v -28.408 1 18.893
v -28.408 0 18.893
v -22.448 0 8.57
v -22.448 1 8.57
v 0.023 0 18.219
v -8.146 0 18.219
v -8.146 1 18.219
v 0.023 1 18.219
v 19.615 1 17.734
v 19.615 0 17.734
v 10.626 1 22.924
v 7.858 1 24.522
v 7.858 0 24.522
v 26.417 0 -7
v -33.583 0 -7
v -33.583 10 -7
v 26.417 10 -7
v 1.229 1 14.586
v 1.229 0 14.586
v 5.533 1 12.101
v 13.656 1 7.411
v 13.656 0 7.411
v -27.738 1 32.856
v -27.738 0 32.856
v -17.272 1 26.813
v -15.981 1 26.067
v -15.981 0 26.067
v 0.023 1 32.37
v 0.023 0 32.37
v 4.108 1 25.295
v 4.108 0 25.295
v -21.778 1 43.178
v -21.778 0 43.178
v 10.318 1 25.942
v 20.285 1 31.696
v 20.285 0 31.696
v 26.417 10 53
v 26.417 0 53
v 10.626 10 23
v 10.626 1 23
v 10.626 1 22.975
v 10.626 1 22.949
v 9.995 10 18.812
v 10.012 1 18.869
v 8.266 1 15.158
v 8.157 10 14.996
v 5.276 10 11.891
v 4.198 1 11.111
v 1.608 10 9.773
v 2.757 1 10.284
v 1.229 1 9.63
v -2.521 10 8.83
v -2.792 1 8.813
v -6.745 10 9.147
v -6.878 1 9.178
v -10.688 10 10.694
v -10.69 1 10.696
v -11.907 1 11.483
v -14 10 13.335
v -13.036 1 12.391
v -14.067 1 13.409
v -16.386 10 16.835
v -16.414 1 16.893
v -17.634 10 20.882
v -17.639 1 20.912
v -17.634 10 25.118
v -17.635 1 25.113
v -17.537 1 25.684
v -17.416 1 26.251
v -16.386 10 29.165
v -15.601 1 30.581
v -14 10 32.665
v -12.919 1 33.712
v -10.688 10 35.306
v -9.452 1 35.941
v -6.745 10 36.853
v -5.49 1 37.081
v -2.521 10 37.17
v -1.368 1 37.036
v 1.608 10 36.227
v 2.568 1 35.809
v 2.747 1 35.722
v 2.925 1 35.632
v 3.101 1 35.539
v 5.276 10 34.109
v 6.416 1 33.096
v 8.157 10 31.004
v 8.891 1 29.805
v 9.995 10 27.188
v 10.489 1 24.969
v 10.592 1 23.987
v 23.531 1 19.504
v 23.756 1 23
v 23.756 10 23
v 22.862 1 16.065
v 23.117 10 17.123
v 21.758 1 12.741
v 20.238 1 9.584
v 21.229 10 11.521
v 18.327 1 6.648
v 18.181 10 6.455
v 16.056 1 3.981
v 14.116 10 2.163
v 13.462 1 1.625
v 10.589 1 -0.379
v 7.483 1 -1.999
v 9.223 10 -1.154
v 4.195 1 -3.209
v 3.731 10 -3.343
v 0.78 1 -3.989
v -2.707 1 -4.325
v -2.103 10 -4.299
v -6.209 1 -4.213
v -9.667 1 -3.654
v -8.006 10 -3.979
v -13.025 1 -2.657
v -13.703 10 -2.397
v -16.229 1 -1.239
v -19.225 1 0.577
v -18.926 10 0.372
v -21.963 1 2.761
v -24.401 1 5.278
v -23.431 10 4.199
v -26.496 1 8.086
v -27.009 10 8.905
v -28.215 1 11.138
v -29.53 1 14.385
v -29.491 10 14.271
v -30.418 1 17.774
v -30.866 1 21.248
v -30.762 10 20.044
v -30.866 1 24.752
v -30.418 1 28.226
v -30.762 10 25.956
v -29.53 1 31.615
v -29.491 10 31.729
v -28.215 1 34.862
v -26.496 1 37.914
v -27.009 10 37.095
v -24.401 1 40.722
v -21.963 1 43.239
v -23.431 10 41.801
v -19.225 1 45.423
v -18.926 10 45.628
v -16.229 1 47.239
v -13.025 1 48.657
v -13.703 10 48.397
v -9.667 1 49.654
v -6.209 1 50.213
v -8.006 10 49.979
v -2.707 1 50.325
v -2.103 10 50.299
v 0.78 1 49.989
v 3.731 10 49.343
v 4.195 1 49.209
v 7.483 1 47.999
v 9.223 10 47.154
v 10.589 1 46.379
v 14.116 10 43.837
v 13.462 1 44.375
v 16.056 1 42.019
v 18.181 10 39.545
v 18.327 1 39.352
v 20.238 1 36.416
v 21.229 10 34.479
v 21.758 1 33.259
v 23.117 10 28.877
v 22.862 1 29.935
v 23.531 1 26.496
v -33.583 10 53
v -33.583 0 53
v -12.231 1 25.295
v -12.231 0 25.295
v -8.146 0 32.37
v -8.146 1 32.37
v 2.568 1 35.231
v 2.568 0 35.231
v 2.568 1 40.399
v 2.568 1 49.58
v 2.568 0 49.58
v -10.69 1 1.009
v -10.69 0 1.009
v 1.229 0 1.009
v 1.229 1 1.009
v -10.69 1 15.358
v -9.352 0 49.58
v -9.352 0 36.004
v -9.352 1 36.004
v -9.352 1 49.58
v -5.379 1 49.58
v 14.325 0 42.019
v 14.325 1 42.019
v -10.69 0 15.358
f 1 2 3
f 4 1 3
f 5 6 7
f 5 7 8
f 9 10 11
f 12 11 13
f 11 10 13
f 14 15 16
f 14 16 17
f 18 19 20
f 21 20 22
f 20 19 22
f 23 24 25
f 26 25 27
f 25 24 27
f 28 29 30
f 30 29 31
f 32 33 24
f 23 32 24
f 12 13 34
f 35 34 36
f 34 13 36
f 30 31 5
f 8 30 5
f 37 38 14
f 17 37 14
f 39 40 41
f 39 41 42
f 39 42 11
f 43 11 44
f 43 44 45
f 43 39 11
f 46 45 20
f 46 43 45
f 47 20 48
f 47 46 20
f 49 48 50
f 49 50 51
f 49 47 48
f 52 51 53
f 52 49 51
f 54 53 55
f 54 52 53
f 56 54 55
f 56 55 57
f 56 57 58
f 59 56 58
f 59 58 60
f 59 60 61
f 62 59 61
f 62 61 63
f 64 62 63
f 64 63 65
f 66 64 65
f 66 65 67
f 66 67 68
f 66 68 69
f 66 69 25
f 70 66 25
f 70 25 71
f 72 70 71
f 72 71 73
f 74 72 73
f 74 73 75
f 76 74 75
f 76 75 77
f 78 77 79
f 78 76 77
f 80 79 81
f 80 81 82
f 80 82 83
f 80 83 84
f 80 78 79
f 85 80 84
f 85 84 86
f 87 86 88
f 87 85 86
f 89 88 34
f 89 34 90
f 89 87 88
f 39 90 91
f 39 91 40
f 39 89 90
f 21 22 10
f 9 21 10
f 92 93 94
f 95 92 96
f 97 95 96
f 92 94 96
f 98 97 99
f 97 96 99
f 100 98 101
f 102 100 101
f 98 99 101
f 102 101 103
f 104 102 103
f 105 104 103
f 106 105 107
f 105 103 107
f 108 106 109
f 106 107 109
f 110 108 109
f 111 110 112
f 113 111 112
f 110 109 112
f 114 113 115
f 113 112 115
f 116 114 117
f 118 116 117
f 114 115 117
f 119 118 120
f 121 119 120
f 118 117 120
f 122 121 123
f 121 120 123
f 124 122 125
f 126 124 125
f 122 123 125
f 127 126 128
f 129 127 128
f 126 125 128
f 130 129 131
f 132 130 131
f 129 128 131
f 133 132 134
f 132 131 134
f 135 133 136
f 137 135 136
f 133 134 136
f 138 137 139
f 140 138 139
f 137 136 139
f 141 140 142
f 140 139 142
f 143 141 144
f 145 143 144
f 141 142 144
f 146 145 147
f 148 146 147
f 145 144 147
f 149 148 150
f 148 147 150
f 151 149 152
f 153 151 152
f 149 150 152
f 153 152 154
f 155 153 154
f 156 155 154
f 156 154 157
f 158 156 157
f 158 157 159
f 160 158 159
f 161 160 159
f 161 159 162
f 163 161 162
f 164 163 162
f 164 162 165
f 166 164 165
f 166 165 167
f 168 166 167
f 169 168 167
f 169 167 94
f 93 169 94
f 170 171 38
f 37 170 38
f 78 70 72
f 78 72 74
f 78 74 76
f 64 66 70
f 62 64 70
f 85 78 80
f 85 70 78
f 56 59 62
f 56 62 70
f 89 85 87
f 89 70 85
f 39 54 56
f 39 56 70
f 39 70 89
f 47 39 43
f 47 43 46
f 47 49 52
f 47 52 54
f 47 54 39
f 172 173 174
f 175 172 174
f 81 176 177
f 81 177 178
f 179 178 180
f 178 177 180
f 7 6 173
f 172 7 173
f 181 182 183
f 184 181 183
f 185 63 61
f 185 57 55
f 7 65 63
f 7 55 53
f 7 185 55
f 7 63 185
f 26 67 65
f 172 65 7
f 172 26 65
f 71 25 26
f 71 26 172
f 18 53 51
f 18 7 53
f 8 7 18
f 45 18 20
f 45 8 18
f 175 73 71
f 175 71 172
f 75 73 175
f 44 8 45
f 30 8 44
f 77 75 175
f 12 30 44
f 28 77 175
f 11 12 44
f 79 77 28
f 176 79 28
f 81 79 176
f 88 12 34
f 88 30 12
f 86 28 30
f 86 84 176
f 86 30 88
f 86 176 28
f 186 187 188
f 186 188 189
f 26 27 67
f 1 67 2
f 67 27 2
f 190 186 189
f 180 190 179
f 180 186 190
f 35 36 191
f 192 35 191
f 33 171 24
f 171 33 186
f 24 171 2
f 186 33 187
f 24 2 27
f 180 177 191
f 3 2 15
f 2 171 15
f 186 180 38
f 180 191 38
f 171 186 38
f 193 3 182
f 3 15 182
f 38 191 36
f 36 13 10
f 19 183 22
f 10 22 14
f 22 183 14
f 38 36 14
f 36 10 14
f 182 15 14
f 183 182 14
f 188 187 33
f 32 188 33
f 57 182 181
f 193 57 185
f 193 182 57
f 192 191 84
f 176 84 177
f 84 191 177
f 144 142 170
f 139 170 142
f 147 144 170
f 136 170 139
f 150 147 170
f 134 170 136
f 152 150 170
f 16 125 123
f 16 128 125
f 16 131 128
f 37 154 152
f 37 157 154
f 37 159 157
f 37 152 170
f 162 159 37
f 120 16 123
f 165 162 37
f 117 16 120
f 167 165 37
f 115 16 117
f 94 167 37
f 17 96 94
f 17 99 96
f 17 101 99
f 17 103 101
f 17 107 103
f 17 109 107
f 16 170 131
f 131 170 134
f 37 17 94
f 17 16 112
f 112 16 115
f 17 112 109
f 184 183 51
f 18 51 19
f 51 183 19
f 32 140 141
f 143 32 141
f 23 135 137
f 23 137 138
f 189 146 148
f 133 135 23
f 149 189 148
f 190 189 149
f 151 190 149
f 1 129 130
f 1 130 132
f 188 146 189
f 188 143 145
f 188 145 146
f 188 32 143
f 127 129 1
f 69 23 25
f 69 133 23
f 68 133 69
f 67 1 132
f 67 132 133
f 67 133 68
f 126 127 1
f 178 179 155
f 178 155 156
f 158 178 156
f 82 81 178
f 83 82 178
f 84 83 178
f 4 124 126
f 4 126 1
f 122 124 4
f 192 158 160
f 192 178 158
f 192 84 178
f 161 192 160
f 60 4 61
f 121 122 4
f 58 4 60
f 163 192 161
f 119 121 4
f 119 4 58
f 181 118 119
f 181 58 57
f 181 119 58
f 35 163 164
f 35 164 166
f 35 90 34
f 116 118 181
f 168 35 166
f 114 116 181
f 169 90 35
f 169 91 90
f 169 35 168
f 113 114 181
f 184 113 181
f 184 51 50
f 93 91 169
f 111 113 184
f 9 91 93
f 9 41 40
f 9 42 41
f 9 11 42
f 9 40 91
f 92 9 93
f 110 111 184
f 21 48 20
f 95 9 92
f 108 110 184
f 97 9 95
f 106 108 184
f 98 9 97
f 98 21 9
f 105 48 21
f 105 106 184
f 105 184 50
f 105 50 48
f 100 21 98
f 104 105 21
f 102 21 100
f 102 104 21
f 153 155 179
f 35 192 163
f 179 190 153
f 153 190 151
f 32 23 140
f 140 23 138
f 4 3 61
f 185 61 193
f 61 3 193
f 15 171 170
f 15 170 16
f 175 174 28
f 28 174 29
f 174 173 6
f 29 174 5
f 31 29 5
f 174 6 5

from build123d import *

# Parameters (mm, degrees)
SKETCH1_W           = 60
SKETCH1_H           = 60
BOSS_EXTRUDE1_DEPTH = 10
SKETCH2_R           = 27.339129043
SKETCH2_R_2         = 14.209467058
CUT_EXTRUDE1_DEPTH  = 9
SKETCH3_W           = 11.919517594
SKETCH3_H           = 17.209998666
SKETCH3_W_2         = 11.919517595
CUT_EXTRUDE3_DEPTH  = 1


with BuildPart() as part:
    # Sketch1 → Boss-Extrude1 (new body)
    with BuildSketch(Plane(origin=(0, 0, 0), x_dir=(1, 0, 0), z_dir=(0, 1, 0))):
        with Locations((-3.583333333, -23)):
            Rectangle(SKETCH1_W, SKETCH1_H)
    extrude(amount=BOSS_EXTRUDE1_DEPTH)

    # Sketch2 → Cut-Extrude1 (cut)
    with BuildSketch(Plane(origin=(0, 10, 0), x_dir=(1, 0, 0), z_dir=(0, 1, 0))):
        with Locations((-3.583333333, -23)):
            Circle(SKETCH2_R)
        with Locations((-3.583333333, -23)):
            Circle(SKETCH2_R_2, mode=Mode.SUBTRACT)
    extrude(amount=-CUT_EXTRUDE1_DEPTH, mode=Mode.SUBTRACT)

    # Sketch3 → Cut-Extrude3 (cut)
    with BuildSketch(Plane.XZ):
        Polygon((14.324988363, 42.018967665), (-0.579307681, 33.413968332), (5.380451117, 23.091363294), (20.284747161, 31.696362627), align=None)
        with Locations((-3.392111126, 40.974887496)):
            Rectangle(SKETCH3_W, SKETCH3_H)
        Polygon((19.615469435, 17.733747325), (4.711173391, 26.338746658), (-1.248585407, 16.01614162), (13.655710637, 7.411142287), align=None)
        with Locations((-4.730666578, 9.614445482)):
            Rectangle(SKETCH3_W_2, SKETCH3_H)
        Polygon((-22.447766067, 8.570365313), (-7.543470023, 17.175364646), (-13.50322882, 27.497969684), (-28.407524864, 18.892970351), align=None)
        Polygon((-27.738247138, 32.855585653), (-12.833951095, 24.25058632), (-6.874192297, 34.573191357), (-21.778488341, 43.178190691), align=None)
    extrude(amount=-CUT_EXTRUDE3_DEPTH, mode=Mode.SUBTRACT)


solid = part.part
